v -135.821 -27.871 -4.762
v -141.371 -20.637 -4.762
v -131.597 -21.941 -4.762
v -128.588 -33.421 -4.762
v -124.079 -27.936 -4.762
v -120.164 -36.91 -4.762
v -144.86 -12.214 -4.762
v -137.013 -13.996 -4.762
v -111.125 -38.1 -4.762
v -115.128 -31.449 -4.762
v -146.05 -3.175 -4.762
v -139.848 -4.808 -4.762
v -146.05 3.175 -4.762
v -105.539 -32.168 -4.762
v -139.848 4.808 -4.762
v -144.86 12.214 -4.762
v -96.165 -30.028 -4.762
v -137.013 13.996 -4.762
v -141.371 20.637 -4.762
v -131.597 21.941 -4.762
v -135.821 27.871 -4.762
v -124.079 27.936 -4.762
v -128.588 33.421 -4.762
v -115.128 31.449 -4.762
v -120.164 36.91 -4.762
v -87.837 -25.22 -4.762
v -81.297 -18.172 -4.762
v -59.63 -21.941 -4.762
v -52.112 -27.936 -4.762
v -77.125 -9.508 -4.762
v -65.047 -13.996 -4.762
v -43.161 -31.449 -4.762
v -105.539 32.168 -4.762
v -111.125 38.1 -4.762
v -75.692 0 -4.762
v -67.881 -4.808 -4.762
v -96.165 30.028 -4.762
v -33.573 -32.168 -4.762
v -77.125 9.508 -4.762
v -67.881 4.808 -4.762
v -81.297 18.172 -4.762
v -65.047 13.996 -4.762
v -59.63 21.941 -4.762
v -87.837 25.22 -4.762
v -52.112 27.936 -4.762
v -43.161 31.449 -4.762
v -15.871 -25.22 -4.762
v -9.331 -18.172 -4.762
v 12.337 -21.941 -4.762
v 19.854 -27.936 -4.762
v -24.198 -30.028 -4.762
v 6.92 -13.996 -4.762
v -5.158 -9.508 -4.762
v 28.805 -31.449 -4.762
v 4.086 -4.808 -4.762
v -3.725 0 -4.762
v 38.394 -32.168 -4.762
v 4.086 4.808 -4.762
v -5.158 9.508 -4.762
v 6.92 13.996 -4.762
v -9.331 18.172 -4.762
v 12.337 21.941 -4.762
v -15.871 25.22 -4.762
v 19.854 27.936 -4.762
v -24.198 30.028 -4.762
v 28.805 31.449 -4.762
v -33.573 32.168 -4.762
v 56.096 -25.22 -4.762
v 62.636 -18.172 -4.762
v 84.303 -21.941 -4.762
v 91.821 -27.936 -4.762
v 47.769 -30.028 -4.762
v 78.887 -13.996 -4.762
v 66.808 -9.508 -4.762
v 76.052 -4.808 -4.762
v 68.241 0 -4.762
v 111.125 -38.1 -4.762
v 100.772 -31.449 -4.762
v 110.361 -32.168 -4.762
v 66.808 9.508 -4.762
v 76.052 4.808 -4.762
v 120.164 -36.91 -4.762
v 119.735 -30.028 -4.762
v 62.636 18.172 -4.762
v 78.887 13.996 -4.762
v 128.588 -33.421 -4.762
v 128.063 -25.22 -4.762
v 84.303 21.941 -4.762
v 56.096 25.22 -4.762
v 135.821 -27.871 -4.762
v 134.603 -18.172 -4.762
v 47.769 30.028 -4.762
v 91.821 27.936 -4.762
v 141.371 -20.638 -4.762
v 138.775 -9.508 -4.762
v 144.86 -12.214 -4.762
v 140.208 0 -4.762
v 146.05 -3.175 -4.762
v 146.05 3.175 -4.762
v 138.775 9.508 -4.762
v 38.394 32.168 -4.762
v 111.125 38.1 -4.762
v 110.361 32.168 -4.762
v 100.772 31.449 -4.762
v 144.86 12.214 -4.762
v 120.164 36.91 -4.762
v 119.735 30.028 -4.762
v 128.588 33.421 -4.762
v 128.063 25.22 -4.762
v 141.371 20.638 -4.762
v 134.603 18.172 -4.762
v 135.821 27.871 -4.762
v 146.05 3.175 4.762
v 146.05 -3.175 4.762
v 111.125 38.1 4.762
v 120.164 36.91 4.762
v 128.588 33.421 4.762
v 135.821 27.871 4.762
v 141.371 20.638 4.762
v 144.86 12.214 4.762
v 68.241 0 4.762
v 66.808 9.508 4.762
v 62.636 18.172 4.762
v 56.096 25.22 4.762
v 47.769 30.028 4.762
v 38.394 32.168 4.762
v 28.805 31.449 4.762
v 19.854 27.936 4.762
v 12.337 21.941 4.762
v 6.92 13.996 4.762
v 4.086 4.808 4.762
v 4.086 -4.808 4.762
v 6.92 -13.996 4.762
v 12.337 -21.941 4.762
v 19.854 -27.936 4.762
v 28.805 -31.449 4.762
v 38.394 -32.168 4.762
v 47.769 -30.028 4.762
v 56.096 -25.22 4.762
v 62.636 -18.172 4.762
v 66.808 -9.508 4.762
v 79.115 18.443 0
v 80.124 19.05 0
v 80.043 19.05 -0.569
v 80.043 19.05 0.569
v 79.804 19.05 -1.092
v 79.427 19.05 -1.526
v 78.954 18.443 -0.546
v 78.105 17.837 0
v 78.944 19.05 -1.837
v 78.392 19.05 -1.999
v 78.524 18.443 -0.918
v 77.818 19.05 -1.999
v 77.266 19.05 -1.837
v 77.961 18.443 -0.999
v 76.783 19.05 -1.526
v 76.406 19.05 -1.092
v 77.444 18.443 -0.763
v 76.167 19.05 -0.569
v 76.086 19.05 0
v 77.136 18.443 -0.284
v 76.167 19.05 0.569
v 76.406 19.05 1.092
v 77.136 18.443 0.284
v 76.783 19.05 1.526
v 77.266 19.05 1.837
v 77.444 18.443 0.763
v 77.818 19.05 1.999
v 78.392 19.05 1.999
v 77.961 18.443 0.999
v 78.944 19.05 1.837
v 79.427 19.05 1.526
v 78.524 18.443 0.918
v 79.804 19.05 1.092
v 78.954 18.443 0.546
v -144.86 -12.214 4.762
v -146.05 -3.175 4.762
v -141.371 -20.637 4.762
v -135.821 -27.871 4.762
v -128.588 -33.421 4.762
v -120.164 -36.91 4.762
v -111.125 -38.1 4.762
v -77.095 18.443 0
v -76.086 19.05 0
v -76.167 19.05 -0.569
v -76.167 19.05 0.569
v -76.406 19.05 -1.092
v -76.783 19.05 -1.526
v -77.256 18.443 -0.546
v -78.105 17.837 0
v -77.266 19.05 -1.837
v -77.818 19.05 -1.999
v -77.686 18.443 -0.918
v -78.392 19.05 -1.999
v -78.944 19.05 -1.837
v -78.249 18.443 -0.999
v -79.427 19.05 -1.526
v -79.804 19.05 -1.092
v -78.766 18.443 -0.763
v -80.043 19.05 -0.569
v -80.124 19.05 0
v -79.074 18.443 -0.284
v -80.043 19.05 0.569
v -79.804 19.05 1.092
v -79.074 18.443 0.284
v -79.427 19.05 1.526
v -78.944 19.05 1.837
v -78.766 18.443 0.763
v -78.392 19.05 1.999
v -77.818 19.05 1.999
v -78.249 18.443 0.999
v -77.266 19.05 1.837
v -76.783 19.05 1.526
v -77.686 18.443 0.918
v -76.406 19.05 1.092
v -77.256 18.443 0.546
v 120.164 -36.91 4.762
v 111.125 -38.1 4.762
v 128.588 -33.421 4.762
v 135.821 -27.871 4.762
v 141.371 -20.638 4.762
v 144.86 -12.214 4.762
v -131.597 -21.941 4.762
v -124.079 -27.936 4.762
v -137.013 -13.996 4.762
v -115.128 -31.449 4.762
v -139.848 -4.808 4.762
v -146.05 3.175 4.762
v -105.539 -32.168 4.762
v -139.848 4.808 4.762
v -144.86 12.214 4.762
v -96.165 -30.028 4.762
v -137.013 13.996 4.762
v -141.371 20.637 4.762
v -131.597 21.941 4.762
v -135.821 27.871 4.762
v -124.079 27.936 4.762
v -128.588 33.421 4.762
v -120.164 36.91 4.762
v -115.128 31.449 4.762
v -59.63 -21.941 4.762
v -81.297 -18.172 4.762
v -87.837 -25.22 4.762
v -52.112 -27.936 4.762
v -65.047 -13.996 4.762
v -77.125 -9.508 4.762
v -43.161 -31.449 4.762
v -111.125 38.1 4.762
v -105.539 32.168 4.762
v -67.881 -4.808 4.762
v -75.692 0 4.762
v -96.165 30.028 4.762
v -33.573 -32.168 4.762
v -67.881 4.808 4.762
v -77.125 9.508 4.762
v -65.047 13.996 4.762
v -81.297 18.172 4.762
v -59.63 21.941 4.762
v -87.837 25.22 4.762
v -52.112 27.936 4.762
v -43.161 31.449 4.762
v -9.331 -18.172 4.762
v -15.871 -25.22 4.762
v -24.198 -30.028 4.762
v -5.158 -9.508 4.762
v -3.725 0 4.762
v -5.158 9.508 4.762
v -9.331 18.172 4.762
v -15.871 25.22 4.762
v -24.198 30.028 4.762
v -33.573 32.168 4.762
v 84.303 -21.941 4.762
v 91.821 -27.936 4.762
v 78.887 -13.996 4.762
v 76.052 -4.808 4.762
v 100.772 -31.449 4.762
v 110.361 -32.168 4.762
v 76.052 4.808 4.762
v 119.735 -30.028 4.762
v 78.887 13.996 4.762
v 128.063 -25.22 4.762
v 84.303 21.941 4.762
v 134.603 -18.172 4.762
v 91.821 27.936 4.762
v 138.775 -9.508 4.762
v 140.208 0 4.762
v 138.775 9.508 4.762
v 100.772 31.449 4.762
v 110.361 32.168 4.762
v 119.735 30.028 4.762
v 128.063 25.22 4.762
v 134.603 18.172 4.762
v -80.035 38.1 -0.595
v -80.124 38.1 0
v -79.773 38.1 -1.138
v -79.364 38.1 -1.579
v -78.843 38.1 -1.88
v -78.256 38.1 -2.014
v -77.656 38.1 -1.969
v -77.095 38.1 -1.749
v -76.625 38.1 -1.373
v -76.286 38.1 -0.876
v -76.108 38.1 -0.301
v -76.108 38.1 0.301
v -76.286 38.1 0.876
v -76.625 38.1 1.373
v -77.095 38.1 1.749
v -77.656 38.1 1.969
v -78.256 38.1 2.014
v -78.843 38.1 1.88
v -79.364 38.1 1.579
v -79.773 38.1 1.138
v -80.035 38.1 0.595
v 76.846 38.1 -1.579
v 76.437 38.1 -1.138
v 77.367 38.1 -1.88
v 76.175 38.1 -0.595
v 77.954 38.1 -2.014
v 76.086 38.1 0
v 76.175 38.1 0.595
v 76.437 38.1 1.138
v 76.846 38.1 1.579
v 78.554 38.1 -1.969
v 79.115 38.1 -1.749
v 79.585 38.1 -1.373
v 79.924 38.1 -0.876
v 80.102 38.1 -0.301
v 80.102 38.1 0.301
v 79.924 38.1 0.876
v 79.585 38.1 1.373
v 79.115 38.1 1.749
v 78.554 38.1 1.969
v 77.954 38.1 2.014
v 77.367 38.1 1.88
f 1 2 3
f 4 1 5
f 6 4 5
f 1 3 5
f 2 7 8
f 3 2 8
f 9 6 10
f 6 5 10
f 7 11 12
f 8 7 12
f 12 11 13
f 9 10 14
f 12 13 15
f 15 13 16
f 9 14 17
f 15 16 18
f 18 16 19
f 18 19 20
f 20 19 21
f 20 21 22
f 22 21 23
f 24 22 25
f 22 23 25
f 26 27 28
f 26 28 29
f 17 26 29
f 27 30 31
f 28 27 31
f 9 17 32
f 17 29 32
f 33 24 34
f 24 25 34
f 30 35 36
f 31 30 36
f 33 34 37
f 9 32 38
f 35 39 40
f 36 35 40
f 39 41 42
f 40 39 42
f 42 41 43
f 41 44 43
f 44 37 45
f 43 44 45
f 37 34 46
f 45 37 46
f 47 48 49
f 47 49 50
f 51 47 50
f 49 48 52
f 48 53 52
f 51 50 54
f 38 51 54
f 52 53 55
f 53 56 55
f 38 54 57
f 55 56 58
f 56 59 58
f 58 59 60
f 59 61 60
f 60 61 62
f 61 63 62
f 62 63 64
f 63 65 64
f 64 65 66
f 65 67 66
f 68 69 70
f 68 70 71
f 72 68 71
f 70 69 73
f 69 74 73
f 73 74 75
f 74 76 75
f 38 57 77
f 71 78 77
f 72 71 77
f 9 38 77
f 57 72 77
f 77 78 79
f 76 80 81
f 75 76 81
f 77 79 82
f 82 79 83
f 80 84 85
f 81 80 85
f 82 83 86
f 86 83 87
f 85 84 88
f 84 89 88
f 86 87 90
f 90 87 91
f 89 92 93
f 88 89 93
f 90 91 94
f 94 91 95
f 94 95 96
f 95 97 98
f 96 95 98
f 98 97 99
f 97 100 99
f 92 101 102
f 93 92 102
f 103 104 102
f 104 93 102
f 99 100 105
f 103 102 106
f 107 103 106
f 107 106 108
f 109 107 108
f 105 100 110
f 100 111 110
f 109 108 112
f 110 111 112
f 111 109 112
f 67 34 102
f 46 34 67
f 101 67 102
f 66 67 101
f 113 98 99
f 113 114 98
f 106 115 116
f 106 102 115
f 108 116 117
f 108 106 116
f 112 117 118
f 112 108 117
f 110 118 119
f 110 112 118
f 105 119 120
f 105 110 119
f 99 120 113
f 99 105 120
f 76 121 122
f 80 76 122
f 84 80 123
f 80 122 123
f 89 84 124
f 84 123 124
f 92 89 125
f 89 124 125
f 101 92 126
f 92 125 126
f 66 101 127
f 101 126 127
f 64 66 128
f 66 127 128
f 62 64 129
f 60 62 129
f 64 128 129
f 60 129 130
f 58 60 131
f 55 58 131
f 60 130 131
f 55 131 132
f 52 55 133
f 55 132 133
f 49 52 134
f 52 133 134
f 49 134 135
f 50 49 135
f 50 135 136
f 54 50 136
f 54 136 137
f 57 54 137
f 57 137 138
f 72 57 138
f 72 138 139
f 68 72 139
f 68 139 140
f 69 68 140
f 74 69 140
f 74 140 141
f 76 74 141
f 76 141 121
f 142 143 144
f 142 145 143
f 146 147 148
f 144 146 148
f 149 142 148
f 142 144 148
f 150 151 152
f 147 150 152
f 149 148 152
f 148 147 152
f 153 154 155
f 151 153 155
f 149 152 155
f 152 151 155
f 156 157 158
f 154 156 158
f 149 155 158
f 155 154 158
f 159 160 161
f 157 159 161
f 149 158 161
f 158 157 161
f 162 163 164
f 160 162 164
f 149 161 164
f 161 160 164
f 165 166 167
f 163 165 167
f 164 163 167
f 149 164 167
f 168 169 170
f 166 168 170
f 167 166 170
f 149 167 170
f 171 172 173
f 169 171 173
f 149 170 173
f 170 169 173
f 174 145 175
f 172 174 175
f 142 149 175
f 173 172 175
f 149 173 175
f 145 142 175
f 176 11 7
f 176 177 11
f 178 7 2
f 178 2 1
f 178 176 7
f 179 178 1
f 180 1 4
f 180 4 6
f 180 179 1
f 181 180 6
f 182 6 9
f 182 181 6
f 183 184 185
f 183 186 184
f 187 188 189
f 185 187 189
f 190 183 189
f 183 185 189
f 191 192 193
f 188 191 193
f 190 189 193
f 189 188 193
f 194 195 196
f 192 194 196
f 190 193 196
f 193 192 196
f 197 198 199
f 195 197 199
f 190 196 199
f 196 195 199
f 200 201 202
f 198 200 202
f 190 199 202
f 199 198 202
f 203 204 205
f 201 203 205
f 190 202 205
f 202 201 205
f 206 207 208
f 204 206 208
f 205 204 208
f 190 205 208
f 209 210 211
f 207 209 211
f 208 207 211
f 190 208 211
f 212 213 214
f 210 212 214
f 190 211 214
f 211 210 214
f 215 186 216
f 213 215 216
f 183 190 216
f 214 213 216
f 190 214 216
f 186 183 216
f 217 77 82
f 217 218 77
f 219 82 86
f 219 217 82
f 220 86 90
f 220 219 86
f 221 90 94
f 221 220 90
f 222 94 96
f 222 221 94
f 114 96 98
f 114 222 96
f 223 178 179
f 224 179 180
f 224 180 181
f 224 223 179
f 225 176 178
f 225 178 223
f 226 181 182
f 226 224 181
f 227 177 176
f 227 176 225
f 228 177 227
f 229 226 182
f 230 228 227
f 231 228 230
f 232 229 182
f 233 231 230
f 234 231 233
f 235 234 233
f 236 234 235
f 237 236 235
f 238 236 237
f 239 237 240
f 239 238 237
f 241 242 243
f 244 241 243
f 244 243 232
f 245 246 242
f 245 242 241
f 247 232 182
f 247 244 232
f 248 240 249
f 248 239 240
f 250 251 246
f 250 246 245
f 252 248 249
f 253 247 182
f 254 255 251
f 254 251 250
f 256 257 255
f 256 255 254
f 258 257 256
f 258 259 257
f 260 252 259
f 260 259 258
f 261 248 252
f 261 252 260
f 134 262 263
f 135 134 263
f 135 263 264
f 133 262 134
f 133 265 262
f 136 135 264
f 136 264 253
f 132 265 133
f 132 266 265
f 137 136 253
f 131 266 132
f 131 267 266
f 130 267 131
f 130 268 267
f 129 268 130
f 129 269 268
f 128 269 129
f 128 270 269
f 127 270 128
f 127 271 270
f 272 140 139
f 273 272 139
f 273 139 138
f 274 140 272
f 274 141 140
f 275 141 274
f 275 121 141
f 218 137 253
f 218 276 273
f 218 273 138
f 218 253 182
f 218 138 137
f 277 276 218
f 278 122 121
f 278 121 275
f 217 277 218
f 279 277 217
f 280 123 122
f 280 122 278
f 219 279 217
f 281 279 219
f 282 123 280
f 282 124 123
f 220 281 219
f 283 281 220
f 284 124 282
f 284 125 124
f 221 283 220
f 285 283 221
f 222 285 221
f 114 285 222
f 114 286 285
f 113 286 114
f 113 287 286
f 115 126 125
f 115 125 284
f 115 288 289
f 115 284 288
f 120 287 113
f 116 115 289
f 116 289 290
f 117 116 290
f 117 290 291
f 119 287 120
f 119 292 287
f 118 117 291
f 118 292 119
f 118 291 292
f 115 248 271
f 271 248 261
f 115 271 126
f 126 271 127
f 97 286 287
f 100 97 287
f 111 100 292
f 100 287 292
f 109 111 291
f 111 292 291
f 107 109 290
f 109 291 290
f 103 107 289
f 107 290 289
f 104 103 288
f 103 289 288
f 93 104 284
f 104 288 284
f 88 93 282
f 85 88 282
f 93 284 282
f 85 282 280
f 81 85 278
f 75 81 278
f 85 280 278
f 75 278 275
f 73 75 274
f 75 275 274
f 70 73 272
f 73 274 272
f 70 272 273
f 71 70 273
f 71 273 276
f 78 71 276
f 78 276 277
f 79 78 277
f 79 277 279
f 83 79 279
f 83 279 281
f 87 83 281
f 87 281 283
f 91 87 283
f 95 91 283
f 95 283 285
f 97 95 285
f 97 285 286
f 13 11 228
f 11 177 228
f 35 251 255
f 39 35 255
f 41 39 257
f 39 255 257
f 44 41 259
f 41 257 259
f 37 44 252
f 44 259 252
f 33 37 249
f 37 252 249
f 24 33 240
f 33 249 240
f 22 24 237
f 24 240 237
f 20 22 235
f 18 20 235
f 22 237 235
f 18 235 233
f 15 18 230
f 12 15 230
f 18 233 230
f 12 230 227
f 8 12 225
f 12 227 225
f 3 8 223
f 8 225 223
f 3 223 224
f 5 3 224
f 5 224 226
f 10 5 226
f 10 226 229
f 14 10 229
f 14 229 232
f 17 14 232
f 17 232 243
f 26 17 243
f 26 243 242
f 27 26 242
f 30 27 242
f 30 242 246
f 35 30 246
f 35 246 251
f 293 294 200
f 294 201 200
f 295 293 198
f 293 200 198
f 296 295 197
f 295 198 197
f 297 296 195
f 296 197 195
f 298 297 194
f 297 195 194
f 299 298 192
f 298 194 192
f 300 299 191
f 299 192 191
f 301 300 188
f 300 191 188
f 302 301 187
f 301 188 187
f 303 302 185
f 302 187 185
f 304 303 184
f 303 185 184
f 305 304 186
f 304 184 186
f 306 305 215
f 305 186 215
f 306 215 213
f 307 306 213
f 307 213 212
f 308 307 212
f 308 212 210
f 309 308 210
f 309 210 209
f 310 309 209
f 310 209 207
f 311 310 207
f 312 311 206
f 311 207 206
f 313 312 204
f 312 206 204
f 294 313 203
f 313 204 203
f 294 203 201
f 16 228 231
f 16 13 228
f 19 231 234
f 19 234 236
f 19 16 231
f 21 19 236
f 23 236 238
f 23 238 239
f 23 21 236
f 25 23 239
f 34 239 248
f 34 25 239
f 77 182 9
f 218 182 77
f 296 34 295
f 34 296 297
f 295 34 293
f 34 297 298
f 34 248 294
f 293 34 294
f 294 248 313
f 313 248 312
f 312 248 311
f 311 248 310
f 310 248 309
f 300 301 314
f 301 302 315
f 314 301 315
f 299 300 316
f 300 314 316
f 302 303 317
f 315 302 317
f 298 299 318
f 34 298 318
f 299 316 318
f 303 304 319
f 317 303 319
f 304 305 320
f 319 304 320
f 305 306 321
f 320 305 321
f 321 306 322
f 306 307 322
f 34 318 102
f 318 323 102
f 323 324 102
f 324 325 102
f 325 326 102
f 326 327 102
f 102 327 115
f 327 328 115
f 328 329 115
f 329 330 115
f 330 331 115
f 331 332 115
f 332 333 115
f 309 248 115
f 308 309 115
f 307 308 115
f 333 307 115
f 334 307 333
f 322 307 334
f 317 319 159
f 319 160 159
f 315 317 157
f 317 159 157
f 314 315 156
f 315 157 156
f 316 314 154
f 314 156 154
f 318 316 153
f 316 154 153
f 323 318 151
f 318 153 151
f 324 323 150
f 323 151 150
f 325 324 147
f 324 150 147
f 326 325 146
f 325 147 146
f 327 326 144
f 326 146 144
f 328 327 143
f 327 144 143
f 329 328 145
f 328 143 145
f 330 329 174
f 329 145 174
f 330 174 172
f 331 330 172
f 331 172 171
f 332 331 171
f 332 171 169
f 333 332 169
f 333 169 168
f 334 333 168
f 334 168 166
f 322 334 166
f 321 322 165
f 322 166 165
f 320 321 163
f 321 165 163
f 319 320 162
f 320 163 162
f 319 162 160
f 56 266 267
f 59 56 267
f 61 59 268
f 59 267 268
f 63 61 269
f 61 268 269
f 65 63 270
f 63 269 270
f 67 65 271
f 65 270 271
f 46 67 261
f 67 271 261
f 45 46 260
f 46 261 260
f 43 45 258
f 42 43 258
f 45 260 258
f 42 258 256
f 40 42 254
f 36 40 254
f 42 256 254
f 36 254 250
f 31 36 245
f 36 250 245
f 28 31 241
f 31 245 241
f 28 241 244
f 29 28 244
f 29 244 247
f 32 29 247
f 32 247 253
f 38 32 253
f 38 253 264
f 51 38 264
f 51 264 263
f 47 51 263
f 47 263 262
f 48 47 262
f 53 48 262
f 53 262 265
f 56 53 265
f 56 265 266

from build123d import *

# Parameters (mm, degrees)
SKETCH1_W                  = 292.1
SKETCH1_H                  = 76.2
BOSS_EXTRUDE1_DEPTH        = 4.7625
SKETCH2_R                  = 32.258
CUT_EXTRUDE1_DEPTH         = 10.525
FILLET1_R                  = 34.925
F_10_32_TAPPED_HOLE2_D     = 4.0386
F_10_32_TAPPED_HOLE2_DEPTH = 19.05
F_10_32_TAPPED_HOLE2_TIP   = 1.213317848


with BuildPart() as part:
    # Sketch1 → Boss-Extrude1 (new body, symmetric)
    with BuildSketch(Plane.XY):
        Rectangle(SKETCH1_W, SKETCH1_H)
    extrude(amount=BOSS_EXTRUDE1_DEPTH, both=True)

    # Sketch2 → Cut-Extrude1 (cut, through all)
    with BuildSketch(Plane.XY.offset(4.7625)):
        with Locations((-107.95, 0)):
            Circle(SKETCH2_R)
        with Locations((-35.983333333, 0)):
            Circle(SKETCH2_R)
        with Locations((35.983333333, 0)):
            Circle(SKETCH2_R)
        with Locations((107.95, 0)):
            Circle(SKETCH2_R)
    extrude(amount=-CUT_EXTRUDE1_DEPTH, mode=Mode.SUBTRACT)

    # Fillet1
    fillet1_edges = [part.edges().sort_by_distance(p)[0] for p in [
        (-146.05, 38.1, 0),
        (146.05, 38.1, 0),
        (146.05, -38.1, 0),
        (-146.05, -38.1, 0),
    ]]
    fillet(fillet1_edges, radius=FILLET1_R)

    # #10-32 Tapped Hole2
    with Locations(Plane(origin=(0, 38.1, 0), x_dir=(1, 0, 0), z_dir=(0, 1, 0))):
        with Locations((-78.105, 0), (78.105, 0)):
            Hole(F_10_32_TAPPED_HOLE2_D / 2, depth=F_10_32_TAPPED_HOLE2_DEPTH)
            with Locations((0, 0, -(F_10_32_TAPPED_HOLE2_DEPTH + F_10_32_TAPPED_HOLE2_TIP / 2))):  # 118° drill point
                Cone(0, F_10_32_TAPPED_HOLE2_D / 2, F_10_32_TAPPED_HOLE2_TIP, mode=Mode.SUBTRACT)


solid = part.part
